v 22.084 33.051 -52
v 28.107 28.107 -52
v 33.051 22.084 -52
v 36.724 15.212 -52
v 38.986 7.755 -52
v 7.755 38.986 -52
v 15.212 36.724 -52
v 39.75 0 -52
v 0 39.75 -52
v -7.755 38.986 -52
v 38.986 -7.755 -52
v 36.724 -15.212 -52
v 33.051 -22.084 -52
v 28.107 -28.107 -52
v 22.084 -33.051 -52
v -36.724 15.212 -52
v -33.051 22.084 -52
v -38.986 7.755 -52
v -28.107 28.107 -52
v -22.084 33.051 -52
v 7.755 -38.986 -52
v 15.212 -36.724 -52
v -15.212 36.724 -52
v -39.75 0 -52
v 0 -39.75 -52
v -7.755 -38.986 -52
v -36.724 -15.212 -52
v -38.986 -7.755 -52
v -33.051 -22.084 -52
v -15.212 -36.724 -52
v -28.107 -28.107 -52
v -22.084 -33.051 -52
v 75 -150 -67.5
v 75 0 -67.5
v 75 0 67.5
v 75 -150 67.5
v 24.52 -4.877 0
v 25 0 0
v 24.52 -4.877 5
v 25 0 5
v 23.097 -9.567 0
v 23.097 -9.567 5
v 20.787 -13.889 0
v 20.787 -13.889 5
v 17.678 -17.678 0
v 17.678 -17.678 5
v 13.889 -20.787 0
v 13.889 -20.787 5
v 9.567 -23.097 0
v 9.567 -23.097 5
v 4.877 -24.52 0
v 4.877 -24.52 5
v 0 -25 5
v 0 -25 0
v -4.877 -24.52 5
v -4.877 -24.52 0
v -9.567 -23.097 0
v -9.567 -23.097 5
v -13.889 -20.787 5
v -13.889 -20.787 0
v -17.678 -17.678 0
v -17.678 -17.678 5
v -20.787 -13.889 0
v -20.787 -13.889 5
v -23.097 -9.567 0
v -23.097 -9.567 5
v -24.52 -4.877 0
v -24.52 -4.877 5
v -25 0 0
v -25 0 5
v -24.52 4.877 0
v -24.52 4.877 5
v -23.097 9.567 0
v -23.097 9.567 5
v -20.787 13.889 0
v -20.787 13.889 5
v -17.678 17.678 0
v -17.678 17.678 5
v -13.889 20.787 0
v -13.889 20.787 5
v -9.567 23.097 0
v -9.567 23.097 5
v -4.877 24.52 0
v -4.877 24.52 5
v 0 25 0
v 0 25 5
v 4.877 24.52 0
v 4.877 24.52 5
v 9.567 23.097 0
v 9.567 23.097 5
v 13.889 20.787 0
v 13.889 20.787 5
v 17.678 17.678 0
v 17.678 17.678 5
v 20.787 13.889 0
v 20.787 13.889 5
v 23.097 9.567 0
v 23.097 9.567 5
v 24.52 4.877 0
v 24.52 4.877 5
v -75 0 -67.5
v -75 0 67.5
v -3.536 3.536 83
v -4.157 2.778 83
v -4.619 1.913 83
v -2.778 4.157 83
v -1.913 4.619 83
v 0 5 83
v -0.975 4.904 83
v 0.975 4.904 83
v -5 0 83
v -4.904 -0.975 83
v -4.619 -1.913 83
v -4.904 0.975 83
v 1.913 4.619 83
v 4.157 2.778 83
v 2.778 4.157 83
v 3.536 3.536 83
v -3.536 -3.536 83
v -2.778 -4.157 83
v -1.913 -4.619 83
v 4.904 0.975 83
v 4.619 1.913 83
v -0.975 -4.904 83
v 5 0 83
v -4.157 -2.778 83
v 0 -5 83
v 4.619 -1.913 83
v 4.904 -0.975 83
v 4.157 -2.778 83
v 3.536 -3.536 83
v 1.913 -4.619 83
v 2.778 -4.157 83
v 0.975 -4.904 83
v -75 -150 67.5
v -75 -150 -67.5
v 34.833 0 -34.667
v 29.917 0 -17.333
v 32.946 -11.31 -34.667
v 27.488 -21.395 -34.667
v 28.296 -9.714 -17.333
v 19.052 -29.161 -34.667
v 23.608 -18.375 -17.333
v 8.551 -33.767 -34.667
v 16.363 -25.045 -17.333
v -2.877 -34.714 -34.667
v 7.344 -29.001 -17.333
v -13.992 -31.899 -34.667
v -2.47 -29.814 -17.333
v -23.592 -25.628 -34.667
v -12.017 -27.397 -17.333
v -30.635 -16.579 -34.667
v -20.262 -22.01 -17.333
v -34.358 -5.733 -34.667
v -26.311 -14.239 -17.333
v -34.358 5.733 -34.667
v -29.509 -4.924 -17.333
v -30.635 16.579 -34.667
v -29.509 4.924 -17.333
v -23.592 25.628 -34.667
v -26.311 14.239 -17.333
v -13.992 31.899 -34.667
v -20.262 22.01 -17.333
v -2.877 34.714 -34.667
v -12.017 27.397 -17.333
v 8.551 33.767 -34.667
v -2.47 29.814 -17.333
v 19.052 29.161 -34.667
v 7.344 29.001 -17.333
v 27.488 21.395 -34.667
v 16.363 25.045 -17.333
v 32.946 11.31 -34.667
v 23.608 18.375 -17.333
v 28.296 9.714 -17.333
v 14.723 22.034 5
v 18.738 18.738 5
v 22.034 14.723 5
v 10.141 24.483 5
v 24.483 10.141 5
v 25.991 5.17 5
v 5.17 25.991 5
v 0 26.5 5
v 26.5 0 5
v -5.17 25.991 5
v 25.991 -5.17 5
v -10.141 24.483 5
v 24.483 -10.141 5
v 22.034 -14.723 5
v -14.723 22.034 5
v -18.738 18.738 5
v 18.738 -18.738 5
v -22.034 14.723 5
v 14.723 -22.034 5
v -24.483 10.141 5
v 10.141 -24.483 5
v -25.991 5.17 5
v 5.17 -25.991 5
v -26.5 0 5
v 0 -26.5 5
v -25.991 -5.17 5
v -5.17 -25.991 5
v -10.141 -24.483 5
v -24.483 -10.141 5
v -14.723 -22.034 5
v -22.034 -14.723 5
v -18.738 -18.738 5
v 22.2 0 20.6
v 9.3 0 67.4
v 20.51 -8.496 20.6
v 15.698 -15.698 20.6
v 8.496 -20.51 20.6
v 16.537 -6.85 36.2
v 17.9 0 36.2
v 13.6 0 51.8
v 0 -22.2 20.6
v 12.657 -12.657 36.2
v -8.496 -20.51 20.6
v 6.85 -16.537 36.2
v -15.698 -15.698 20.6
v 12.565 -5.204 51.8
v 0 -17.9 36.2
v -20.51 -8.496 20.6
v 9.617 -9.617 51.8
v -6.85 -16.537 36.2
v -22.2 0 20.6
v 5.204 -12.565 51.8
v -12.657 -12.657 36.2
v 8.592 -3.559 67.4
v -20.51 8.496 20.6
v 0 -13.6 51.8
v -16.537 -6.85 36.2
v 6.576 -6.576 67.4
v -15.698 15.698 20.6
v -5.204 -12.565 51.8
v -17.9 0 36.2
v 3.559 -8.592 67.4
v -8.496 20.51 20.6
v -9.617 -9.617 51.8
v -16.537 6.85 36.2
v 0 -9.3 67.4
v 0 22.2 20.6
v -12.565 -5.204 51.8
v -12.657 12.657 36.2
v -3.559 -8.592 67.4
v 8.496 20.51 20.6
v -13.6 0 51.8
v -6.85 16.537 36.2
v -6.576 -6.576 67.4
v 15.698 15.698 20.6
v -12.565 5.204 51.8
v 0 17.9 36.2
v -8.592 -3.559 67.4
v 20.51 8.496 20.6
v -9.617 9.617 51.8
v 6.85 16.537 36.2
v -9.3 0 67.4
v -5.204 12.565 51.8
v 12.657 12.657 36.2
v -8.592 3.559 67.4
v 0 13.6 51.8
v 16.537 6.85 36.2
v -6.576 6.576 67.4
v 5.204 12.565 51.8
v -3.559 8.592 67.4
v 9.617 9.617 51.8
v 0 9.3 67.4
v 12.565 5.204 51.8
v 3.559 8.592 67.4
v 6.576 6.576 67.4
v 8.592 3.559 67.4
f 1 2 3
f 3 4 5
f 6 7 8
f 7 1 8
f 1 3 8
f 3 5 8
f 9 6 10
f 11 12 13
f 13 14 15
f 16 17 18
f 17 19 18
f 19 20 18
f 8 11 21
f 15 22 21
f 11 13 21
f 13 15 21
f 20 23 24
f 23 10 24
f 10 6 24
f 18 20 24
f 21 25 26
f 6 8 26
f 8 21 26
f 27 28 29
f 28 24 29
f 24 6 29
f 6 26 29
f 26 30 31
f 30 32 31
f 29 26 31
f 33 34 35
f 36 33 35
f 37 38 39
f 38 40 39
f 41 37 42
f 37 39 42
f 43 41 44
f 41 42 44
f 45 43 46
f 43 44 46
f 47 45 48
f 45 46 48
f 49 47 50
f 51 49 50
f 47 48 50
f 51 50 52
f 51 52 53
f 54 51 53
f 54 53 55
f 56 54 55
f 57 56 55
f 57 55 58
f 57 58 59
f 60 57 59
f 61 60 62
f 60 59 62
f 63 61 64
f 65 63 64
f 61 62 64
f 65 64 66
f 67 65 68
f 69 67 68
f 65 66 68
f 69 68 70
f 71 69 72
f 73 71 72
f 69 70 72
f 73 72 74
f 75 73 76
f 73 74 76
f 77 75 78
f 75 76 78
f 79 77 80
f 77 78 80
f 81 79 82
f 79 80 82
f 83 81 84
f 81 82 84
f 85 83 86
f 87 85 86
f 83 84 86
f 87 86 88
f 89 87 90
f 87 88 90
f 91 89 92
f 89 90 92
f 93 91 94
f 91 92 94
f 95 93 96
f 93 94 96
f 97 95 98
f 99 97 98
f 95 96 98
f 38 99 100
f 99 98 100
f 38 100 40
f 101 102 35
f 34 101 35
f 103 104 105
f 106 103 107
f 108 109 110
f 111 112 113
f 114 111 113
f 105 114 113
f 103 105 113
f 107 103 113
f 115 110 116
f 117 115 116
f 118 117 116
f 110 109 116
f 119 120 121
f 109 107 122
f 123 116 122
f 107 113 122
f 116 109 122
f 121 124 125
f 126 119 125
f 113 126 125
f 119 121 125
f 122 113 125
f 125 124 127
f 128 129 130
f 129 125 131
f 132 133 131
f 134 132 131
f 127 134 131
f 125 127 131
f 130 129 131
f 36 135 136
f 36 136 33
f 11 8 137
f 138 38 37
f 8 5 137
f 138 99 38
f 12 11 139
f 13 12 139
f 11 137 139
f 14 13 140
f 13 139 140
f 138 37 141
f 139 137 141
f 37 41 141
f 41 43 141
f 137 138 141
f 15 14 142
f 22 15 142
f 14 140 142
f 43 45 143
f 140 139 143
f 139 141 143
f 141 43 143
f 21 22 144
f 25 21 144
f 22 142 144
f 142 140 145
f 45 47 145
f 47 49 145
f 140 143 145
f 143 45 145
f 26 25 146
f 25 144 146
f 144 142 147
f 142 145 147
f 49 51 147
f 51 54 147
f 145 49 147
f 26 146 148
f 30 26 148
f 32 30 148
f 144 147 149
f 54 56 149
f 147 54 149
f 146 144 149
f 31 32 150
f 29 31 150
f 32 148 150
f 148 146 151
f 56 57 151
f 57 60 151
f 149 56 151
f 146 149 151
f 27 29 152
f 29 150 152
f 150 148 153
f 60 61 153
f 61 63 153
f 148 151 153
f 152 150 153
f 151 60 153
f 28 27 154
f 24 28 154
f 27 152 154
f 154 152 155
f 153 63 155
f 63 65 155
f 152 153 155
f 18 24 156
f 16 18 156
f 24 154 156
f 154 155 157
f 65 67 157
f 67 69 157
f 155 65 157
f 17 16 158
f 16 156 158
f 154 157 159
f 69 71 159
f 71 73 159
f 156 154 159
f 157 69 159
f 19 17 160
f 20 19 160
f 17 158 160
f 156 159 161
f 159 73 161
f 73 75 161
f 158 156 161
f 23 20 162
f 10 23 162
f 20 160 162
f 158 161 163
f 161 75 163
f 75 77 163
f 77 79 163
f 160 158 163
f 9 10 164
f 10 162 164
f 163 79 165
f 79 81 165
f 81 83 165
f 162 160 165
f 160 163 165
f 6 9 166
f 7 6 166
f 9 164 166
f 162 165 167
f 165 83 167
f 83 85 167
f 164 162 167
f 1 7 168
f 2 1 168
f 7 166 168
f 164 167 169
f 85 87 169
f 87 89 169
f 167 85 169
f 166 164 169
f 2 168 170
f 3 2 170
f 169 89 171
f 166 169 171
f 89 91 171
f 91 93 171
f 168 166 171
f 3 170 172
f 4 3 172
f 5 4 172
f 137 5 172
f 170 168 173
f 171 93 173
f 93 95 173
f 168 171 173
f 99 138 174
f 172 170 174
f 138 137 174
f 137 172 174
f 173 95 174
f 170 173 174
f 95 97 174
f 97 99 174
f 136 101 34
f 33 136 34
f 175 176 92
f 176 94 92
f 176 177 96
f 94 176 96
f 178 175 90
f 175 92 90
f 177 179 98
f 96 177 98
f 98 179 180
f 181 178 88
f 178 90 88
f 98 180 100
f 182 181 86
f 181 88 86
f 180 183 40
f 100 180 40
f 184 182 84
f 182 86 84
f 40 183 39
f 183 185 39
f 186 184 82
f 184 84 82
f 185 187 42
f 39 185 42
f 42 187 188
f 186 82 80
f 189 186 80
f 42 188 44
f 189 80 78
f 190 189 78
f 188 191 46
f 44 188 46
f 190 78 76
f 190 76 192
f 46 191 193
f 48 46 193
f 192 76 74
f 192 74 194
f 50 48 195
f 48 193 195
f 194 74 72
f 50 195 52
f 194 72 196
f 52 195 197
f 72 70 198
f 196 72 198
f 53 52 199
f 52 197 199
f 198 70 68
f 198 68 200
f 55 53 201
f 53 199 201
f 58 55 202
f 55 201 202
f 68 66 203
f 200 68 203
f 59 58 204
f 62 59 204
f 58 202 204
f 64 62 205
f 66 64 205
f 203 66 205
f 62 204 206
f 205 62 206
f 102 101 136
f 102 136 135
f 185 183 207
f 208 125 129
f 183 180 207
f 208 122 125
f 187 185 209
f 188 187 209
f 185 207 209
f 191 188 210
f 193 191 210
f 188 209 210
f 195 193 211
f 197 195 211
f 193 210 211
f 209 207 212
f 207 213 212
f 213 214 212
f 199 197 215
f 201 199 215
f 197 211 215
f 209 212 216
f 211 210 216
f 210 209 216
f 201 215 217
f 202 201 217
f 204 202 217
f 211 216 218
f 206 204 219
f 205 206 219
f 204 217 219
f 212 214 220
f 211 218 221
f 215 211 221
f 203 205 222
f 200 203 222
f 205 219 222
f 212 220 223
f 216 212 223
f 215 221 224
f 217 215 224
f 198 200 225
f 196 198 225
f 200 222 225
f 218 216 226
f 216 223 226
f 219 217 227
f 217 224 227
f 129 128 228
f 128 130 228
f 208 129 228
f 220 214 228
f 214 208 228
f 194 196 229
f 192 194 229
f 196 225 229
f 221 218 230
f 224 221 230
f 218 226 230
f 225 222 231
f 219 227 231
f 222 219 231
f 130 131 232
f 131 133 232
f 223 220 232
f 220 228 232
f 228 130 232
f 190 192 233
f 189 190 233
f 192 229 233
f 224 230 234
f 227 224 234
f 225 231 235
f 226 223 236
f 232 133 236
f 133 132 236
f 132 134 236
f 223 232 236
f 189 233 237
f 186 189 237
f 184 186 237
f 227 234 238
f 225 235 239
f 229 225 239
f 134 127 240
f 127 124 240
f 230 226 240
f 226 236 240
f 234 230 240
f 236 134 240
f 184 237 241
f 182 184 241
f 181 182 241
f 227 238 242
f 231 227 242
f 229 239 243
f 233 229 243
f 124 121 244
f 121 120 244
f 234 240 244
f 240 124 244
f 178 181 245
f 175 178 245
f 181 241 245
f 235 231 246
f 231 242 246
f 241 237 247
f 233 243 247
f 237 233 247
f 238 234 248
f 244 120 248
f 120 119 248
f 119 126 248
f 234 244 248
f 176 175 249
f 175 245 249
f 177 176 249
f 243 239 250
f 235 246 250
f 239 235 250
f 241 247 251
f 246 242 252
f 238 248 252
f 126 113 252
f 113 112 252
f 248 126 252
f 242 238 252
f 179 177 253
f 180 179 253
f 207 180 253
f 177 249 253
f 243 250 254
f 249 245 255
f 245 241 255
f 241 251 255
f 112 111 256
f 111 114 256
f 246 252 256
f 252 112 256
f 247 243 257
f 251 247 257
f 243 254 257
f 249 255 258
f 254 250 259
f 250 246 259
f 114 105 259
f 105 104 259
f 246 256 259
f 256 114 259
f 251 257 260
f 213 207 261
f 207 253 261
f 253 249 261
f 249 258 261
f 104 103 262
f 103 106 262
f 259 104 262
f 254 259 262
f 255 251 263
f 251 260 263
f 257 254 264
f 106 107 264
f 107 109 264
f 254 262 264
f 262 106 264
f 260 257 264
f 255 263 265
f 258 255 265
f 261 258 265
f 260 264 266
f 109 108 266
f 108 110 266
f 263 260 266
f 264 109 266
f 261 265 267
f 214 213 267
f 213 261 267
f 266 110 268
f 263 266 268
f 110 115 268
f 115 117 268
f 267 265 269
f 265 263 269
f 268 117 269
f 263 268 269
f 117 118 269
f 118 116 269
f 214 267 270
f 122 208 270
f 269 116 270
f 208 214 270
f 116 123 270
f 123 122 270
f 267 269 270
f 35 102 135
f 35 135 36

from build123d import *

# Parameters (mm, degrees)
F2_W     = 150
F2_H     = 135
F3_DEPTH = 150


with BuildPart() as f1:
    # F0 (on Front) → F1 (revolve)
    with BuildSketch(Plane.XZ):
        Polygon((5, 83), (0, 83), (0, 0), (0, -52), (39.75, -52), (25, 0), (25, 5), (26.5, 5), align=None)
    revolve(axis=Axis((0, 0, 41.5), (0, 0, -1)))


with BuildPart() as f3:
    # F2 (on Front) → F3 (new body)
    with BuildSketch(Plane.XZ):
        Rectangle(F2_W, F2_H)
    extrude(amount=F3_DEPTH)


solid = Compound([f1.part, f3.part])
